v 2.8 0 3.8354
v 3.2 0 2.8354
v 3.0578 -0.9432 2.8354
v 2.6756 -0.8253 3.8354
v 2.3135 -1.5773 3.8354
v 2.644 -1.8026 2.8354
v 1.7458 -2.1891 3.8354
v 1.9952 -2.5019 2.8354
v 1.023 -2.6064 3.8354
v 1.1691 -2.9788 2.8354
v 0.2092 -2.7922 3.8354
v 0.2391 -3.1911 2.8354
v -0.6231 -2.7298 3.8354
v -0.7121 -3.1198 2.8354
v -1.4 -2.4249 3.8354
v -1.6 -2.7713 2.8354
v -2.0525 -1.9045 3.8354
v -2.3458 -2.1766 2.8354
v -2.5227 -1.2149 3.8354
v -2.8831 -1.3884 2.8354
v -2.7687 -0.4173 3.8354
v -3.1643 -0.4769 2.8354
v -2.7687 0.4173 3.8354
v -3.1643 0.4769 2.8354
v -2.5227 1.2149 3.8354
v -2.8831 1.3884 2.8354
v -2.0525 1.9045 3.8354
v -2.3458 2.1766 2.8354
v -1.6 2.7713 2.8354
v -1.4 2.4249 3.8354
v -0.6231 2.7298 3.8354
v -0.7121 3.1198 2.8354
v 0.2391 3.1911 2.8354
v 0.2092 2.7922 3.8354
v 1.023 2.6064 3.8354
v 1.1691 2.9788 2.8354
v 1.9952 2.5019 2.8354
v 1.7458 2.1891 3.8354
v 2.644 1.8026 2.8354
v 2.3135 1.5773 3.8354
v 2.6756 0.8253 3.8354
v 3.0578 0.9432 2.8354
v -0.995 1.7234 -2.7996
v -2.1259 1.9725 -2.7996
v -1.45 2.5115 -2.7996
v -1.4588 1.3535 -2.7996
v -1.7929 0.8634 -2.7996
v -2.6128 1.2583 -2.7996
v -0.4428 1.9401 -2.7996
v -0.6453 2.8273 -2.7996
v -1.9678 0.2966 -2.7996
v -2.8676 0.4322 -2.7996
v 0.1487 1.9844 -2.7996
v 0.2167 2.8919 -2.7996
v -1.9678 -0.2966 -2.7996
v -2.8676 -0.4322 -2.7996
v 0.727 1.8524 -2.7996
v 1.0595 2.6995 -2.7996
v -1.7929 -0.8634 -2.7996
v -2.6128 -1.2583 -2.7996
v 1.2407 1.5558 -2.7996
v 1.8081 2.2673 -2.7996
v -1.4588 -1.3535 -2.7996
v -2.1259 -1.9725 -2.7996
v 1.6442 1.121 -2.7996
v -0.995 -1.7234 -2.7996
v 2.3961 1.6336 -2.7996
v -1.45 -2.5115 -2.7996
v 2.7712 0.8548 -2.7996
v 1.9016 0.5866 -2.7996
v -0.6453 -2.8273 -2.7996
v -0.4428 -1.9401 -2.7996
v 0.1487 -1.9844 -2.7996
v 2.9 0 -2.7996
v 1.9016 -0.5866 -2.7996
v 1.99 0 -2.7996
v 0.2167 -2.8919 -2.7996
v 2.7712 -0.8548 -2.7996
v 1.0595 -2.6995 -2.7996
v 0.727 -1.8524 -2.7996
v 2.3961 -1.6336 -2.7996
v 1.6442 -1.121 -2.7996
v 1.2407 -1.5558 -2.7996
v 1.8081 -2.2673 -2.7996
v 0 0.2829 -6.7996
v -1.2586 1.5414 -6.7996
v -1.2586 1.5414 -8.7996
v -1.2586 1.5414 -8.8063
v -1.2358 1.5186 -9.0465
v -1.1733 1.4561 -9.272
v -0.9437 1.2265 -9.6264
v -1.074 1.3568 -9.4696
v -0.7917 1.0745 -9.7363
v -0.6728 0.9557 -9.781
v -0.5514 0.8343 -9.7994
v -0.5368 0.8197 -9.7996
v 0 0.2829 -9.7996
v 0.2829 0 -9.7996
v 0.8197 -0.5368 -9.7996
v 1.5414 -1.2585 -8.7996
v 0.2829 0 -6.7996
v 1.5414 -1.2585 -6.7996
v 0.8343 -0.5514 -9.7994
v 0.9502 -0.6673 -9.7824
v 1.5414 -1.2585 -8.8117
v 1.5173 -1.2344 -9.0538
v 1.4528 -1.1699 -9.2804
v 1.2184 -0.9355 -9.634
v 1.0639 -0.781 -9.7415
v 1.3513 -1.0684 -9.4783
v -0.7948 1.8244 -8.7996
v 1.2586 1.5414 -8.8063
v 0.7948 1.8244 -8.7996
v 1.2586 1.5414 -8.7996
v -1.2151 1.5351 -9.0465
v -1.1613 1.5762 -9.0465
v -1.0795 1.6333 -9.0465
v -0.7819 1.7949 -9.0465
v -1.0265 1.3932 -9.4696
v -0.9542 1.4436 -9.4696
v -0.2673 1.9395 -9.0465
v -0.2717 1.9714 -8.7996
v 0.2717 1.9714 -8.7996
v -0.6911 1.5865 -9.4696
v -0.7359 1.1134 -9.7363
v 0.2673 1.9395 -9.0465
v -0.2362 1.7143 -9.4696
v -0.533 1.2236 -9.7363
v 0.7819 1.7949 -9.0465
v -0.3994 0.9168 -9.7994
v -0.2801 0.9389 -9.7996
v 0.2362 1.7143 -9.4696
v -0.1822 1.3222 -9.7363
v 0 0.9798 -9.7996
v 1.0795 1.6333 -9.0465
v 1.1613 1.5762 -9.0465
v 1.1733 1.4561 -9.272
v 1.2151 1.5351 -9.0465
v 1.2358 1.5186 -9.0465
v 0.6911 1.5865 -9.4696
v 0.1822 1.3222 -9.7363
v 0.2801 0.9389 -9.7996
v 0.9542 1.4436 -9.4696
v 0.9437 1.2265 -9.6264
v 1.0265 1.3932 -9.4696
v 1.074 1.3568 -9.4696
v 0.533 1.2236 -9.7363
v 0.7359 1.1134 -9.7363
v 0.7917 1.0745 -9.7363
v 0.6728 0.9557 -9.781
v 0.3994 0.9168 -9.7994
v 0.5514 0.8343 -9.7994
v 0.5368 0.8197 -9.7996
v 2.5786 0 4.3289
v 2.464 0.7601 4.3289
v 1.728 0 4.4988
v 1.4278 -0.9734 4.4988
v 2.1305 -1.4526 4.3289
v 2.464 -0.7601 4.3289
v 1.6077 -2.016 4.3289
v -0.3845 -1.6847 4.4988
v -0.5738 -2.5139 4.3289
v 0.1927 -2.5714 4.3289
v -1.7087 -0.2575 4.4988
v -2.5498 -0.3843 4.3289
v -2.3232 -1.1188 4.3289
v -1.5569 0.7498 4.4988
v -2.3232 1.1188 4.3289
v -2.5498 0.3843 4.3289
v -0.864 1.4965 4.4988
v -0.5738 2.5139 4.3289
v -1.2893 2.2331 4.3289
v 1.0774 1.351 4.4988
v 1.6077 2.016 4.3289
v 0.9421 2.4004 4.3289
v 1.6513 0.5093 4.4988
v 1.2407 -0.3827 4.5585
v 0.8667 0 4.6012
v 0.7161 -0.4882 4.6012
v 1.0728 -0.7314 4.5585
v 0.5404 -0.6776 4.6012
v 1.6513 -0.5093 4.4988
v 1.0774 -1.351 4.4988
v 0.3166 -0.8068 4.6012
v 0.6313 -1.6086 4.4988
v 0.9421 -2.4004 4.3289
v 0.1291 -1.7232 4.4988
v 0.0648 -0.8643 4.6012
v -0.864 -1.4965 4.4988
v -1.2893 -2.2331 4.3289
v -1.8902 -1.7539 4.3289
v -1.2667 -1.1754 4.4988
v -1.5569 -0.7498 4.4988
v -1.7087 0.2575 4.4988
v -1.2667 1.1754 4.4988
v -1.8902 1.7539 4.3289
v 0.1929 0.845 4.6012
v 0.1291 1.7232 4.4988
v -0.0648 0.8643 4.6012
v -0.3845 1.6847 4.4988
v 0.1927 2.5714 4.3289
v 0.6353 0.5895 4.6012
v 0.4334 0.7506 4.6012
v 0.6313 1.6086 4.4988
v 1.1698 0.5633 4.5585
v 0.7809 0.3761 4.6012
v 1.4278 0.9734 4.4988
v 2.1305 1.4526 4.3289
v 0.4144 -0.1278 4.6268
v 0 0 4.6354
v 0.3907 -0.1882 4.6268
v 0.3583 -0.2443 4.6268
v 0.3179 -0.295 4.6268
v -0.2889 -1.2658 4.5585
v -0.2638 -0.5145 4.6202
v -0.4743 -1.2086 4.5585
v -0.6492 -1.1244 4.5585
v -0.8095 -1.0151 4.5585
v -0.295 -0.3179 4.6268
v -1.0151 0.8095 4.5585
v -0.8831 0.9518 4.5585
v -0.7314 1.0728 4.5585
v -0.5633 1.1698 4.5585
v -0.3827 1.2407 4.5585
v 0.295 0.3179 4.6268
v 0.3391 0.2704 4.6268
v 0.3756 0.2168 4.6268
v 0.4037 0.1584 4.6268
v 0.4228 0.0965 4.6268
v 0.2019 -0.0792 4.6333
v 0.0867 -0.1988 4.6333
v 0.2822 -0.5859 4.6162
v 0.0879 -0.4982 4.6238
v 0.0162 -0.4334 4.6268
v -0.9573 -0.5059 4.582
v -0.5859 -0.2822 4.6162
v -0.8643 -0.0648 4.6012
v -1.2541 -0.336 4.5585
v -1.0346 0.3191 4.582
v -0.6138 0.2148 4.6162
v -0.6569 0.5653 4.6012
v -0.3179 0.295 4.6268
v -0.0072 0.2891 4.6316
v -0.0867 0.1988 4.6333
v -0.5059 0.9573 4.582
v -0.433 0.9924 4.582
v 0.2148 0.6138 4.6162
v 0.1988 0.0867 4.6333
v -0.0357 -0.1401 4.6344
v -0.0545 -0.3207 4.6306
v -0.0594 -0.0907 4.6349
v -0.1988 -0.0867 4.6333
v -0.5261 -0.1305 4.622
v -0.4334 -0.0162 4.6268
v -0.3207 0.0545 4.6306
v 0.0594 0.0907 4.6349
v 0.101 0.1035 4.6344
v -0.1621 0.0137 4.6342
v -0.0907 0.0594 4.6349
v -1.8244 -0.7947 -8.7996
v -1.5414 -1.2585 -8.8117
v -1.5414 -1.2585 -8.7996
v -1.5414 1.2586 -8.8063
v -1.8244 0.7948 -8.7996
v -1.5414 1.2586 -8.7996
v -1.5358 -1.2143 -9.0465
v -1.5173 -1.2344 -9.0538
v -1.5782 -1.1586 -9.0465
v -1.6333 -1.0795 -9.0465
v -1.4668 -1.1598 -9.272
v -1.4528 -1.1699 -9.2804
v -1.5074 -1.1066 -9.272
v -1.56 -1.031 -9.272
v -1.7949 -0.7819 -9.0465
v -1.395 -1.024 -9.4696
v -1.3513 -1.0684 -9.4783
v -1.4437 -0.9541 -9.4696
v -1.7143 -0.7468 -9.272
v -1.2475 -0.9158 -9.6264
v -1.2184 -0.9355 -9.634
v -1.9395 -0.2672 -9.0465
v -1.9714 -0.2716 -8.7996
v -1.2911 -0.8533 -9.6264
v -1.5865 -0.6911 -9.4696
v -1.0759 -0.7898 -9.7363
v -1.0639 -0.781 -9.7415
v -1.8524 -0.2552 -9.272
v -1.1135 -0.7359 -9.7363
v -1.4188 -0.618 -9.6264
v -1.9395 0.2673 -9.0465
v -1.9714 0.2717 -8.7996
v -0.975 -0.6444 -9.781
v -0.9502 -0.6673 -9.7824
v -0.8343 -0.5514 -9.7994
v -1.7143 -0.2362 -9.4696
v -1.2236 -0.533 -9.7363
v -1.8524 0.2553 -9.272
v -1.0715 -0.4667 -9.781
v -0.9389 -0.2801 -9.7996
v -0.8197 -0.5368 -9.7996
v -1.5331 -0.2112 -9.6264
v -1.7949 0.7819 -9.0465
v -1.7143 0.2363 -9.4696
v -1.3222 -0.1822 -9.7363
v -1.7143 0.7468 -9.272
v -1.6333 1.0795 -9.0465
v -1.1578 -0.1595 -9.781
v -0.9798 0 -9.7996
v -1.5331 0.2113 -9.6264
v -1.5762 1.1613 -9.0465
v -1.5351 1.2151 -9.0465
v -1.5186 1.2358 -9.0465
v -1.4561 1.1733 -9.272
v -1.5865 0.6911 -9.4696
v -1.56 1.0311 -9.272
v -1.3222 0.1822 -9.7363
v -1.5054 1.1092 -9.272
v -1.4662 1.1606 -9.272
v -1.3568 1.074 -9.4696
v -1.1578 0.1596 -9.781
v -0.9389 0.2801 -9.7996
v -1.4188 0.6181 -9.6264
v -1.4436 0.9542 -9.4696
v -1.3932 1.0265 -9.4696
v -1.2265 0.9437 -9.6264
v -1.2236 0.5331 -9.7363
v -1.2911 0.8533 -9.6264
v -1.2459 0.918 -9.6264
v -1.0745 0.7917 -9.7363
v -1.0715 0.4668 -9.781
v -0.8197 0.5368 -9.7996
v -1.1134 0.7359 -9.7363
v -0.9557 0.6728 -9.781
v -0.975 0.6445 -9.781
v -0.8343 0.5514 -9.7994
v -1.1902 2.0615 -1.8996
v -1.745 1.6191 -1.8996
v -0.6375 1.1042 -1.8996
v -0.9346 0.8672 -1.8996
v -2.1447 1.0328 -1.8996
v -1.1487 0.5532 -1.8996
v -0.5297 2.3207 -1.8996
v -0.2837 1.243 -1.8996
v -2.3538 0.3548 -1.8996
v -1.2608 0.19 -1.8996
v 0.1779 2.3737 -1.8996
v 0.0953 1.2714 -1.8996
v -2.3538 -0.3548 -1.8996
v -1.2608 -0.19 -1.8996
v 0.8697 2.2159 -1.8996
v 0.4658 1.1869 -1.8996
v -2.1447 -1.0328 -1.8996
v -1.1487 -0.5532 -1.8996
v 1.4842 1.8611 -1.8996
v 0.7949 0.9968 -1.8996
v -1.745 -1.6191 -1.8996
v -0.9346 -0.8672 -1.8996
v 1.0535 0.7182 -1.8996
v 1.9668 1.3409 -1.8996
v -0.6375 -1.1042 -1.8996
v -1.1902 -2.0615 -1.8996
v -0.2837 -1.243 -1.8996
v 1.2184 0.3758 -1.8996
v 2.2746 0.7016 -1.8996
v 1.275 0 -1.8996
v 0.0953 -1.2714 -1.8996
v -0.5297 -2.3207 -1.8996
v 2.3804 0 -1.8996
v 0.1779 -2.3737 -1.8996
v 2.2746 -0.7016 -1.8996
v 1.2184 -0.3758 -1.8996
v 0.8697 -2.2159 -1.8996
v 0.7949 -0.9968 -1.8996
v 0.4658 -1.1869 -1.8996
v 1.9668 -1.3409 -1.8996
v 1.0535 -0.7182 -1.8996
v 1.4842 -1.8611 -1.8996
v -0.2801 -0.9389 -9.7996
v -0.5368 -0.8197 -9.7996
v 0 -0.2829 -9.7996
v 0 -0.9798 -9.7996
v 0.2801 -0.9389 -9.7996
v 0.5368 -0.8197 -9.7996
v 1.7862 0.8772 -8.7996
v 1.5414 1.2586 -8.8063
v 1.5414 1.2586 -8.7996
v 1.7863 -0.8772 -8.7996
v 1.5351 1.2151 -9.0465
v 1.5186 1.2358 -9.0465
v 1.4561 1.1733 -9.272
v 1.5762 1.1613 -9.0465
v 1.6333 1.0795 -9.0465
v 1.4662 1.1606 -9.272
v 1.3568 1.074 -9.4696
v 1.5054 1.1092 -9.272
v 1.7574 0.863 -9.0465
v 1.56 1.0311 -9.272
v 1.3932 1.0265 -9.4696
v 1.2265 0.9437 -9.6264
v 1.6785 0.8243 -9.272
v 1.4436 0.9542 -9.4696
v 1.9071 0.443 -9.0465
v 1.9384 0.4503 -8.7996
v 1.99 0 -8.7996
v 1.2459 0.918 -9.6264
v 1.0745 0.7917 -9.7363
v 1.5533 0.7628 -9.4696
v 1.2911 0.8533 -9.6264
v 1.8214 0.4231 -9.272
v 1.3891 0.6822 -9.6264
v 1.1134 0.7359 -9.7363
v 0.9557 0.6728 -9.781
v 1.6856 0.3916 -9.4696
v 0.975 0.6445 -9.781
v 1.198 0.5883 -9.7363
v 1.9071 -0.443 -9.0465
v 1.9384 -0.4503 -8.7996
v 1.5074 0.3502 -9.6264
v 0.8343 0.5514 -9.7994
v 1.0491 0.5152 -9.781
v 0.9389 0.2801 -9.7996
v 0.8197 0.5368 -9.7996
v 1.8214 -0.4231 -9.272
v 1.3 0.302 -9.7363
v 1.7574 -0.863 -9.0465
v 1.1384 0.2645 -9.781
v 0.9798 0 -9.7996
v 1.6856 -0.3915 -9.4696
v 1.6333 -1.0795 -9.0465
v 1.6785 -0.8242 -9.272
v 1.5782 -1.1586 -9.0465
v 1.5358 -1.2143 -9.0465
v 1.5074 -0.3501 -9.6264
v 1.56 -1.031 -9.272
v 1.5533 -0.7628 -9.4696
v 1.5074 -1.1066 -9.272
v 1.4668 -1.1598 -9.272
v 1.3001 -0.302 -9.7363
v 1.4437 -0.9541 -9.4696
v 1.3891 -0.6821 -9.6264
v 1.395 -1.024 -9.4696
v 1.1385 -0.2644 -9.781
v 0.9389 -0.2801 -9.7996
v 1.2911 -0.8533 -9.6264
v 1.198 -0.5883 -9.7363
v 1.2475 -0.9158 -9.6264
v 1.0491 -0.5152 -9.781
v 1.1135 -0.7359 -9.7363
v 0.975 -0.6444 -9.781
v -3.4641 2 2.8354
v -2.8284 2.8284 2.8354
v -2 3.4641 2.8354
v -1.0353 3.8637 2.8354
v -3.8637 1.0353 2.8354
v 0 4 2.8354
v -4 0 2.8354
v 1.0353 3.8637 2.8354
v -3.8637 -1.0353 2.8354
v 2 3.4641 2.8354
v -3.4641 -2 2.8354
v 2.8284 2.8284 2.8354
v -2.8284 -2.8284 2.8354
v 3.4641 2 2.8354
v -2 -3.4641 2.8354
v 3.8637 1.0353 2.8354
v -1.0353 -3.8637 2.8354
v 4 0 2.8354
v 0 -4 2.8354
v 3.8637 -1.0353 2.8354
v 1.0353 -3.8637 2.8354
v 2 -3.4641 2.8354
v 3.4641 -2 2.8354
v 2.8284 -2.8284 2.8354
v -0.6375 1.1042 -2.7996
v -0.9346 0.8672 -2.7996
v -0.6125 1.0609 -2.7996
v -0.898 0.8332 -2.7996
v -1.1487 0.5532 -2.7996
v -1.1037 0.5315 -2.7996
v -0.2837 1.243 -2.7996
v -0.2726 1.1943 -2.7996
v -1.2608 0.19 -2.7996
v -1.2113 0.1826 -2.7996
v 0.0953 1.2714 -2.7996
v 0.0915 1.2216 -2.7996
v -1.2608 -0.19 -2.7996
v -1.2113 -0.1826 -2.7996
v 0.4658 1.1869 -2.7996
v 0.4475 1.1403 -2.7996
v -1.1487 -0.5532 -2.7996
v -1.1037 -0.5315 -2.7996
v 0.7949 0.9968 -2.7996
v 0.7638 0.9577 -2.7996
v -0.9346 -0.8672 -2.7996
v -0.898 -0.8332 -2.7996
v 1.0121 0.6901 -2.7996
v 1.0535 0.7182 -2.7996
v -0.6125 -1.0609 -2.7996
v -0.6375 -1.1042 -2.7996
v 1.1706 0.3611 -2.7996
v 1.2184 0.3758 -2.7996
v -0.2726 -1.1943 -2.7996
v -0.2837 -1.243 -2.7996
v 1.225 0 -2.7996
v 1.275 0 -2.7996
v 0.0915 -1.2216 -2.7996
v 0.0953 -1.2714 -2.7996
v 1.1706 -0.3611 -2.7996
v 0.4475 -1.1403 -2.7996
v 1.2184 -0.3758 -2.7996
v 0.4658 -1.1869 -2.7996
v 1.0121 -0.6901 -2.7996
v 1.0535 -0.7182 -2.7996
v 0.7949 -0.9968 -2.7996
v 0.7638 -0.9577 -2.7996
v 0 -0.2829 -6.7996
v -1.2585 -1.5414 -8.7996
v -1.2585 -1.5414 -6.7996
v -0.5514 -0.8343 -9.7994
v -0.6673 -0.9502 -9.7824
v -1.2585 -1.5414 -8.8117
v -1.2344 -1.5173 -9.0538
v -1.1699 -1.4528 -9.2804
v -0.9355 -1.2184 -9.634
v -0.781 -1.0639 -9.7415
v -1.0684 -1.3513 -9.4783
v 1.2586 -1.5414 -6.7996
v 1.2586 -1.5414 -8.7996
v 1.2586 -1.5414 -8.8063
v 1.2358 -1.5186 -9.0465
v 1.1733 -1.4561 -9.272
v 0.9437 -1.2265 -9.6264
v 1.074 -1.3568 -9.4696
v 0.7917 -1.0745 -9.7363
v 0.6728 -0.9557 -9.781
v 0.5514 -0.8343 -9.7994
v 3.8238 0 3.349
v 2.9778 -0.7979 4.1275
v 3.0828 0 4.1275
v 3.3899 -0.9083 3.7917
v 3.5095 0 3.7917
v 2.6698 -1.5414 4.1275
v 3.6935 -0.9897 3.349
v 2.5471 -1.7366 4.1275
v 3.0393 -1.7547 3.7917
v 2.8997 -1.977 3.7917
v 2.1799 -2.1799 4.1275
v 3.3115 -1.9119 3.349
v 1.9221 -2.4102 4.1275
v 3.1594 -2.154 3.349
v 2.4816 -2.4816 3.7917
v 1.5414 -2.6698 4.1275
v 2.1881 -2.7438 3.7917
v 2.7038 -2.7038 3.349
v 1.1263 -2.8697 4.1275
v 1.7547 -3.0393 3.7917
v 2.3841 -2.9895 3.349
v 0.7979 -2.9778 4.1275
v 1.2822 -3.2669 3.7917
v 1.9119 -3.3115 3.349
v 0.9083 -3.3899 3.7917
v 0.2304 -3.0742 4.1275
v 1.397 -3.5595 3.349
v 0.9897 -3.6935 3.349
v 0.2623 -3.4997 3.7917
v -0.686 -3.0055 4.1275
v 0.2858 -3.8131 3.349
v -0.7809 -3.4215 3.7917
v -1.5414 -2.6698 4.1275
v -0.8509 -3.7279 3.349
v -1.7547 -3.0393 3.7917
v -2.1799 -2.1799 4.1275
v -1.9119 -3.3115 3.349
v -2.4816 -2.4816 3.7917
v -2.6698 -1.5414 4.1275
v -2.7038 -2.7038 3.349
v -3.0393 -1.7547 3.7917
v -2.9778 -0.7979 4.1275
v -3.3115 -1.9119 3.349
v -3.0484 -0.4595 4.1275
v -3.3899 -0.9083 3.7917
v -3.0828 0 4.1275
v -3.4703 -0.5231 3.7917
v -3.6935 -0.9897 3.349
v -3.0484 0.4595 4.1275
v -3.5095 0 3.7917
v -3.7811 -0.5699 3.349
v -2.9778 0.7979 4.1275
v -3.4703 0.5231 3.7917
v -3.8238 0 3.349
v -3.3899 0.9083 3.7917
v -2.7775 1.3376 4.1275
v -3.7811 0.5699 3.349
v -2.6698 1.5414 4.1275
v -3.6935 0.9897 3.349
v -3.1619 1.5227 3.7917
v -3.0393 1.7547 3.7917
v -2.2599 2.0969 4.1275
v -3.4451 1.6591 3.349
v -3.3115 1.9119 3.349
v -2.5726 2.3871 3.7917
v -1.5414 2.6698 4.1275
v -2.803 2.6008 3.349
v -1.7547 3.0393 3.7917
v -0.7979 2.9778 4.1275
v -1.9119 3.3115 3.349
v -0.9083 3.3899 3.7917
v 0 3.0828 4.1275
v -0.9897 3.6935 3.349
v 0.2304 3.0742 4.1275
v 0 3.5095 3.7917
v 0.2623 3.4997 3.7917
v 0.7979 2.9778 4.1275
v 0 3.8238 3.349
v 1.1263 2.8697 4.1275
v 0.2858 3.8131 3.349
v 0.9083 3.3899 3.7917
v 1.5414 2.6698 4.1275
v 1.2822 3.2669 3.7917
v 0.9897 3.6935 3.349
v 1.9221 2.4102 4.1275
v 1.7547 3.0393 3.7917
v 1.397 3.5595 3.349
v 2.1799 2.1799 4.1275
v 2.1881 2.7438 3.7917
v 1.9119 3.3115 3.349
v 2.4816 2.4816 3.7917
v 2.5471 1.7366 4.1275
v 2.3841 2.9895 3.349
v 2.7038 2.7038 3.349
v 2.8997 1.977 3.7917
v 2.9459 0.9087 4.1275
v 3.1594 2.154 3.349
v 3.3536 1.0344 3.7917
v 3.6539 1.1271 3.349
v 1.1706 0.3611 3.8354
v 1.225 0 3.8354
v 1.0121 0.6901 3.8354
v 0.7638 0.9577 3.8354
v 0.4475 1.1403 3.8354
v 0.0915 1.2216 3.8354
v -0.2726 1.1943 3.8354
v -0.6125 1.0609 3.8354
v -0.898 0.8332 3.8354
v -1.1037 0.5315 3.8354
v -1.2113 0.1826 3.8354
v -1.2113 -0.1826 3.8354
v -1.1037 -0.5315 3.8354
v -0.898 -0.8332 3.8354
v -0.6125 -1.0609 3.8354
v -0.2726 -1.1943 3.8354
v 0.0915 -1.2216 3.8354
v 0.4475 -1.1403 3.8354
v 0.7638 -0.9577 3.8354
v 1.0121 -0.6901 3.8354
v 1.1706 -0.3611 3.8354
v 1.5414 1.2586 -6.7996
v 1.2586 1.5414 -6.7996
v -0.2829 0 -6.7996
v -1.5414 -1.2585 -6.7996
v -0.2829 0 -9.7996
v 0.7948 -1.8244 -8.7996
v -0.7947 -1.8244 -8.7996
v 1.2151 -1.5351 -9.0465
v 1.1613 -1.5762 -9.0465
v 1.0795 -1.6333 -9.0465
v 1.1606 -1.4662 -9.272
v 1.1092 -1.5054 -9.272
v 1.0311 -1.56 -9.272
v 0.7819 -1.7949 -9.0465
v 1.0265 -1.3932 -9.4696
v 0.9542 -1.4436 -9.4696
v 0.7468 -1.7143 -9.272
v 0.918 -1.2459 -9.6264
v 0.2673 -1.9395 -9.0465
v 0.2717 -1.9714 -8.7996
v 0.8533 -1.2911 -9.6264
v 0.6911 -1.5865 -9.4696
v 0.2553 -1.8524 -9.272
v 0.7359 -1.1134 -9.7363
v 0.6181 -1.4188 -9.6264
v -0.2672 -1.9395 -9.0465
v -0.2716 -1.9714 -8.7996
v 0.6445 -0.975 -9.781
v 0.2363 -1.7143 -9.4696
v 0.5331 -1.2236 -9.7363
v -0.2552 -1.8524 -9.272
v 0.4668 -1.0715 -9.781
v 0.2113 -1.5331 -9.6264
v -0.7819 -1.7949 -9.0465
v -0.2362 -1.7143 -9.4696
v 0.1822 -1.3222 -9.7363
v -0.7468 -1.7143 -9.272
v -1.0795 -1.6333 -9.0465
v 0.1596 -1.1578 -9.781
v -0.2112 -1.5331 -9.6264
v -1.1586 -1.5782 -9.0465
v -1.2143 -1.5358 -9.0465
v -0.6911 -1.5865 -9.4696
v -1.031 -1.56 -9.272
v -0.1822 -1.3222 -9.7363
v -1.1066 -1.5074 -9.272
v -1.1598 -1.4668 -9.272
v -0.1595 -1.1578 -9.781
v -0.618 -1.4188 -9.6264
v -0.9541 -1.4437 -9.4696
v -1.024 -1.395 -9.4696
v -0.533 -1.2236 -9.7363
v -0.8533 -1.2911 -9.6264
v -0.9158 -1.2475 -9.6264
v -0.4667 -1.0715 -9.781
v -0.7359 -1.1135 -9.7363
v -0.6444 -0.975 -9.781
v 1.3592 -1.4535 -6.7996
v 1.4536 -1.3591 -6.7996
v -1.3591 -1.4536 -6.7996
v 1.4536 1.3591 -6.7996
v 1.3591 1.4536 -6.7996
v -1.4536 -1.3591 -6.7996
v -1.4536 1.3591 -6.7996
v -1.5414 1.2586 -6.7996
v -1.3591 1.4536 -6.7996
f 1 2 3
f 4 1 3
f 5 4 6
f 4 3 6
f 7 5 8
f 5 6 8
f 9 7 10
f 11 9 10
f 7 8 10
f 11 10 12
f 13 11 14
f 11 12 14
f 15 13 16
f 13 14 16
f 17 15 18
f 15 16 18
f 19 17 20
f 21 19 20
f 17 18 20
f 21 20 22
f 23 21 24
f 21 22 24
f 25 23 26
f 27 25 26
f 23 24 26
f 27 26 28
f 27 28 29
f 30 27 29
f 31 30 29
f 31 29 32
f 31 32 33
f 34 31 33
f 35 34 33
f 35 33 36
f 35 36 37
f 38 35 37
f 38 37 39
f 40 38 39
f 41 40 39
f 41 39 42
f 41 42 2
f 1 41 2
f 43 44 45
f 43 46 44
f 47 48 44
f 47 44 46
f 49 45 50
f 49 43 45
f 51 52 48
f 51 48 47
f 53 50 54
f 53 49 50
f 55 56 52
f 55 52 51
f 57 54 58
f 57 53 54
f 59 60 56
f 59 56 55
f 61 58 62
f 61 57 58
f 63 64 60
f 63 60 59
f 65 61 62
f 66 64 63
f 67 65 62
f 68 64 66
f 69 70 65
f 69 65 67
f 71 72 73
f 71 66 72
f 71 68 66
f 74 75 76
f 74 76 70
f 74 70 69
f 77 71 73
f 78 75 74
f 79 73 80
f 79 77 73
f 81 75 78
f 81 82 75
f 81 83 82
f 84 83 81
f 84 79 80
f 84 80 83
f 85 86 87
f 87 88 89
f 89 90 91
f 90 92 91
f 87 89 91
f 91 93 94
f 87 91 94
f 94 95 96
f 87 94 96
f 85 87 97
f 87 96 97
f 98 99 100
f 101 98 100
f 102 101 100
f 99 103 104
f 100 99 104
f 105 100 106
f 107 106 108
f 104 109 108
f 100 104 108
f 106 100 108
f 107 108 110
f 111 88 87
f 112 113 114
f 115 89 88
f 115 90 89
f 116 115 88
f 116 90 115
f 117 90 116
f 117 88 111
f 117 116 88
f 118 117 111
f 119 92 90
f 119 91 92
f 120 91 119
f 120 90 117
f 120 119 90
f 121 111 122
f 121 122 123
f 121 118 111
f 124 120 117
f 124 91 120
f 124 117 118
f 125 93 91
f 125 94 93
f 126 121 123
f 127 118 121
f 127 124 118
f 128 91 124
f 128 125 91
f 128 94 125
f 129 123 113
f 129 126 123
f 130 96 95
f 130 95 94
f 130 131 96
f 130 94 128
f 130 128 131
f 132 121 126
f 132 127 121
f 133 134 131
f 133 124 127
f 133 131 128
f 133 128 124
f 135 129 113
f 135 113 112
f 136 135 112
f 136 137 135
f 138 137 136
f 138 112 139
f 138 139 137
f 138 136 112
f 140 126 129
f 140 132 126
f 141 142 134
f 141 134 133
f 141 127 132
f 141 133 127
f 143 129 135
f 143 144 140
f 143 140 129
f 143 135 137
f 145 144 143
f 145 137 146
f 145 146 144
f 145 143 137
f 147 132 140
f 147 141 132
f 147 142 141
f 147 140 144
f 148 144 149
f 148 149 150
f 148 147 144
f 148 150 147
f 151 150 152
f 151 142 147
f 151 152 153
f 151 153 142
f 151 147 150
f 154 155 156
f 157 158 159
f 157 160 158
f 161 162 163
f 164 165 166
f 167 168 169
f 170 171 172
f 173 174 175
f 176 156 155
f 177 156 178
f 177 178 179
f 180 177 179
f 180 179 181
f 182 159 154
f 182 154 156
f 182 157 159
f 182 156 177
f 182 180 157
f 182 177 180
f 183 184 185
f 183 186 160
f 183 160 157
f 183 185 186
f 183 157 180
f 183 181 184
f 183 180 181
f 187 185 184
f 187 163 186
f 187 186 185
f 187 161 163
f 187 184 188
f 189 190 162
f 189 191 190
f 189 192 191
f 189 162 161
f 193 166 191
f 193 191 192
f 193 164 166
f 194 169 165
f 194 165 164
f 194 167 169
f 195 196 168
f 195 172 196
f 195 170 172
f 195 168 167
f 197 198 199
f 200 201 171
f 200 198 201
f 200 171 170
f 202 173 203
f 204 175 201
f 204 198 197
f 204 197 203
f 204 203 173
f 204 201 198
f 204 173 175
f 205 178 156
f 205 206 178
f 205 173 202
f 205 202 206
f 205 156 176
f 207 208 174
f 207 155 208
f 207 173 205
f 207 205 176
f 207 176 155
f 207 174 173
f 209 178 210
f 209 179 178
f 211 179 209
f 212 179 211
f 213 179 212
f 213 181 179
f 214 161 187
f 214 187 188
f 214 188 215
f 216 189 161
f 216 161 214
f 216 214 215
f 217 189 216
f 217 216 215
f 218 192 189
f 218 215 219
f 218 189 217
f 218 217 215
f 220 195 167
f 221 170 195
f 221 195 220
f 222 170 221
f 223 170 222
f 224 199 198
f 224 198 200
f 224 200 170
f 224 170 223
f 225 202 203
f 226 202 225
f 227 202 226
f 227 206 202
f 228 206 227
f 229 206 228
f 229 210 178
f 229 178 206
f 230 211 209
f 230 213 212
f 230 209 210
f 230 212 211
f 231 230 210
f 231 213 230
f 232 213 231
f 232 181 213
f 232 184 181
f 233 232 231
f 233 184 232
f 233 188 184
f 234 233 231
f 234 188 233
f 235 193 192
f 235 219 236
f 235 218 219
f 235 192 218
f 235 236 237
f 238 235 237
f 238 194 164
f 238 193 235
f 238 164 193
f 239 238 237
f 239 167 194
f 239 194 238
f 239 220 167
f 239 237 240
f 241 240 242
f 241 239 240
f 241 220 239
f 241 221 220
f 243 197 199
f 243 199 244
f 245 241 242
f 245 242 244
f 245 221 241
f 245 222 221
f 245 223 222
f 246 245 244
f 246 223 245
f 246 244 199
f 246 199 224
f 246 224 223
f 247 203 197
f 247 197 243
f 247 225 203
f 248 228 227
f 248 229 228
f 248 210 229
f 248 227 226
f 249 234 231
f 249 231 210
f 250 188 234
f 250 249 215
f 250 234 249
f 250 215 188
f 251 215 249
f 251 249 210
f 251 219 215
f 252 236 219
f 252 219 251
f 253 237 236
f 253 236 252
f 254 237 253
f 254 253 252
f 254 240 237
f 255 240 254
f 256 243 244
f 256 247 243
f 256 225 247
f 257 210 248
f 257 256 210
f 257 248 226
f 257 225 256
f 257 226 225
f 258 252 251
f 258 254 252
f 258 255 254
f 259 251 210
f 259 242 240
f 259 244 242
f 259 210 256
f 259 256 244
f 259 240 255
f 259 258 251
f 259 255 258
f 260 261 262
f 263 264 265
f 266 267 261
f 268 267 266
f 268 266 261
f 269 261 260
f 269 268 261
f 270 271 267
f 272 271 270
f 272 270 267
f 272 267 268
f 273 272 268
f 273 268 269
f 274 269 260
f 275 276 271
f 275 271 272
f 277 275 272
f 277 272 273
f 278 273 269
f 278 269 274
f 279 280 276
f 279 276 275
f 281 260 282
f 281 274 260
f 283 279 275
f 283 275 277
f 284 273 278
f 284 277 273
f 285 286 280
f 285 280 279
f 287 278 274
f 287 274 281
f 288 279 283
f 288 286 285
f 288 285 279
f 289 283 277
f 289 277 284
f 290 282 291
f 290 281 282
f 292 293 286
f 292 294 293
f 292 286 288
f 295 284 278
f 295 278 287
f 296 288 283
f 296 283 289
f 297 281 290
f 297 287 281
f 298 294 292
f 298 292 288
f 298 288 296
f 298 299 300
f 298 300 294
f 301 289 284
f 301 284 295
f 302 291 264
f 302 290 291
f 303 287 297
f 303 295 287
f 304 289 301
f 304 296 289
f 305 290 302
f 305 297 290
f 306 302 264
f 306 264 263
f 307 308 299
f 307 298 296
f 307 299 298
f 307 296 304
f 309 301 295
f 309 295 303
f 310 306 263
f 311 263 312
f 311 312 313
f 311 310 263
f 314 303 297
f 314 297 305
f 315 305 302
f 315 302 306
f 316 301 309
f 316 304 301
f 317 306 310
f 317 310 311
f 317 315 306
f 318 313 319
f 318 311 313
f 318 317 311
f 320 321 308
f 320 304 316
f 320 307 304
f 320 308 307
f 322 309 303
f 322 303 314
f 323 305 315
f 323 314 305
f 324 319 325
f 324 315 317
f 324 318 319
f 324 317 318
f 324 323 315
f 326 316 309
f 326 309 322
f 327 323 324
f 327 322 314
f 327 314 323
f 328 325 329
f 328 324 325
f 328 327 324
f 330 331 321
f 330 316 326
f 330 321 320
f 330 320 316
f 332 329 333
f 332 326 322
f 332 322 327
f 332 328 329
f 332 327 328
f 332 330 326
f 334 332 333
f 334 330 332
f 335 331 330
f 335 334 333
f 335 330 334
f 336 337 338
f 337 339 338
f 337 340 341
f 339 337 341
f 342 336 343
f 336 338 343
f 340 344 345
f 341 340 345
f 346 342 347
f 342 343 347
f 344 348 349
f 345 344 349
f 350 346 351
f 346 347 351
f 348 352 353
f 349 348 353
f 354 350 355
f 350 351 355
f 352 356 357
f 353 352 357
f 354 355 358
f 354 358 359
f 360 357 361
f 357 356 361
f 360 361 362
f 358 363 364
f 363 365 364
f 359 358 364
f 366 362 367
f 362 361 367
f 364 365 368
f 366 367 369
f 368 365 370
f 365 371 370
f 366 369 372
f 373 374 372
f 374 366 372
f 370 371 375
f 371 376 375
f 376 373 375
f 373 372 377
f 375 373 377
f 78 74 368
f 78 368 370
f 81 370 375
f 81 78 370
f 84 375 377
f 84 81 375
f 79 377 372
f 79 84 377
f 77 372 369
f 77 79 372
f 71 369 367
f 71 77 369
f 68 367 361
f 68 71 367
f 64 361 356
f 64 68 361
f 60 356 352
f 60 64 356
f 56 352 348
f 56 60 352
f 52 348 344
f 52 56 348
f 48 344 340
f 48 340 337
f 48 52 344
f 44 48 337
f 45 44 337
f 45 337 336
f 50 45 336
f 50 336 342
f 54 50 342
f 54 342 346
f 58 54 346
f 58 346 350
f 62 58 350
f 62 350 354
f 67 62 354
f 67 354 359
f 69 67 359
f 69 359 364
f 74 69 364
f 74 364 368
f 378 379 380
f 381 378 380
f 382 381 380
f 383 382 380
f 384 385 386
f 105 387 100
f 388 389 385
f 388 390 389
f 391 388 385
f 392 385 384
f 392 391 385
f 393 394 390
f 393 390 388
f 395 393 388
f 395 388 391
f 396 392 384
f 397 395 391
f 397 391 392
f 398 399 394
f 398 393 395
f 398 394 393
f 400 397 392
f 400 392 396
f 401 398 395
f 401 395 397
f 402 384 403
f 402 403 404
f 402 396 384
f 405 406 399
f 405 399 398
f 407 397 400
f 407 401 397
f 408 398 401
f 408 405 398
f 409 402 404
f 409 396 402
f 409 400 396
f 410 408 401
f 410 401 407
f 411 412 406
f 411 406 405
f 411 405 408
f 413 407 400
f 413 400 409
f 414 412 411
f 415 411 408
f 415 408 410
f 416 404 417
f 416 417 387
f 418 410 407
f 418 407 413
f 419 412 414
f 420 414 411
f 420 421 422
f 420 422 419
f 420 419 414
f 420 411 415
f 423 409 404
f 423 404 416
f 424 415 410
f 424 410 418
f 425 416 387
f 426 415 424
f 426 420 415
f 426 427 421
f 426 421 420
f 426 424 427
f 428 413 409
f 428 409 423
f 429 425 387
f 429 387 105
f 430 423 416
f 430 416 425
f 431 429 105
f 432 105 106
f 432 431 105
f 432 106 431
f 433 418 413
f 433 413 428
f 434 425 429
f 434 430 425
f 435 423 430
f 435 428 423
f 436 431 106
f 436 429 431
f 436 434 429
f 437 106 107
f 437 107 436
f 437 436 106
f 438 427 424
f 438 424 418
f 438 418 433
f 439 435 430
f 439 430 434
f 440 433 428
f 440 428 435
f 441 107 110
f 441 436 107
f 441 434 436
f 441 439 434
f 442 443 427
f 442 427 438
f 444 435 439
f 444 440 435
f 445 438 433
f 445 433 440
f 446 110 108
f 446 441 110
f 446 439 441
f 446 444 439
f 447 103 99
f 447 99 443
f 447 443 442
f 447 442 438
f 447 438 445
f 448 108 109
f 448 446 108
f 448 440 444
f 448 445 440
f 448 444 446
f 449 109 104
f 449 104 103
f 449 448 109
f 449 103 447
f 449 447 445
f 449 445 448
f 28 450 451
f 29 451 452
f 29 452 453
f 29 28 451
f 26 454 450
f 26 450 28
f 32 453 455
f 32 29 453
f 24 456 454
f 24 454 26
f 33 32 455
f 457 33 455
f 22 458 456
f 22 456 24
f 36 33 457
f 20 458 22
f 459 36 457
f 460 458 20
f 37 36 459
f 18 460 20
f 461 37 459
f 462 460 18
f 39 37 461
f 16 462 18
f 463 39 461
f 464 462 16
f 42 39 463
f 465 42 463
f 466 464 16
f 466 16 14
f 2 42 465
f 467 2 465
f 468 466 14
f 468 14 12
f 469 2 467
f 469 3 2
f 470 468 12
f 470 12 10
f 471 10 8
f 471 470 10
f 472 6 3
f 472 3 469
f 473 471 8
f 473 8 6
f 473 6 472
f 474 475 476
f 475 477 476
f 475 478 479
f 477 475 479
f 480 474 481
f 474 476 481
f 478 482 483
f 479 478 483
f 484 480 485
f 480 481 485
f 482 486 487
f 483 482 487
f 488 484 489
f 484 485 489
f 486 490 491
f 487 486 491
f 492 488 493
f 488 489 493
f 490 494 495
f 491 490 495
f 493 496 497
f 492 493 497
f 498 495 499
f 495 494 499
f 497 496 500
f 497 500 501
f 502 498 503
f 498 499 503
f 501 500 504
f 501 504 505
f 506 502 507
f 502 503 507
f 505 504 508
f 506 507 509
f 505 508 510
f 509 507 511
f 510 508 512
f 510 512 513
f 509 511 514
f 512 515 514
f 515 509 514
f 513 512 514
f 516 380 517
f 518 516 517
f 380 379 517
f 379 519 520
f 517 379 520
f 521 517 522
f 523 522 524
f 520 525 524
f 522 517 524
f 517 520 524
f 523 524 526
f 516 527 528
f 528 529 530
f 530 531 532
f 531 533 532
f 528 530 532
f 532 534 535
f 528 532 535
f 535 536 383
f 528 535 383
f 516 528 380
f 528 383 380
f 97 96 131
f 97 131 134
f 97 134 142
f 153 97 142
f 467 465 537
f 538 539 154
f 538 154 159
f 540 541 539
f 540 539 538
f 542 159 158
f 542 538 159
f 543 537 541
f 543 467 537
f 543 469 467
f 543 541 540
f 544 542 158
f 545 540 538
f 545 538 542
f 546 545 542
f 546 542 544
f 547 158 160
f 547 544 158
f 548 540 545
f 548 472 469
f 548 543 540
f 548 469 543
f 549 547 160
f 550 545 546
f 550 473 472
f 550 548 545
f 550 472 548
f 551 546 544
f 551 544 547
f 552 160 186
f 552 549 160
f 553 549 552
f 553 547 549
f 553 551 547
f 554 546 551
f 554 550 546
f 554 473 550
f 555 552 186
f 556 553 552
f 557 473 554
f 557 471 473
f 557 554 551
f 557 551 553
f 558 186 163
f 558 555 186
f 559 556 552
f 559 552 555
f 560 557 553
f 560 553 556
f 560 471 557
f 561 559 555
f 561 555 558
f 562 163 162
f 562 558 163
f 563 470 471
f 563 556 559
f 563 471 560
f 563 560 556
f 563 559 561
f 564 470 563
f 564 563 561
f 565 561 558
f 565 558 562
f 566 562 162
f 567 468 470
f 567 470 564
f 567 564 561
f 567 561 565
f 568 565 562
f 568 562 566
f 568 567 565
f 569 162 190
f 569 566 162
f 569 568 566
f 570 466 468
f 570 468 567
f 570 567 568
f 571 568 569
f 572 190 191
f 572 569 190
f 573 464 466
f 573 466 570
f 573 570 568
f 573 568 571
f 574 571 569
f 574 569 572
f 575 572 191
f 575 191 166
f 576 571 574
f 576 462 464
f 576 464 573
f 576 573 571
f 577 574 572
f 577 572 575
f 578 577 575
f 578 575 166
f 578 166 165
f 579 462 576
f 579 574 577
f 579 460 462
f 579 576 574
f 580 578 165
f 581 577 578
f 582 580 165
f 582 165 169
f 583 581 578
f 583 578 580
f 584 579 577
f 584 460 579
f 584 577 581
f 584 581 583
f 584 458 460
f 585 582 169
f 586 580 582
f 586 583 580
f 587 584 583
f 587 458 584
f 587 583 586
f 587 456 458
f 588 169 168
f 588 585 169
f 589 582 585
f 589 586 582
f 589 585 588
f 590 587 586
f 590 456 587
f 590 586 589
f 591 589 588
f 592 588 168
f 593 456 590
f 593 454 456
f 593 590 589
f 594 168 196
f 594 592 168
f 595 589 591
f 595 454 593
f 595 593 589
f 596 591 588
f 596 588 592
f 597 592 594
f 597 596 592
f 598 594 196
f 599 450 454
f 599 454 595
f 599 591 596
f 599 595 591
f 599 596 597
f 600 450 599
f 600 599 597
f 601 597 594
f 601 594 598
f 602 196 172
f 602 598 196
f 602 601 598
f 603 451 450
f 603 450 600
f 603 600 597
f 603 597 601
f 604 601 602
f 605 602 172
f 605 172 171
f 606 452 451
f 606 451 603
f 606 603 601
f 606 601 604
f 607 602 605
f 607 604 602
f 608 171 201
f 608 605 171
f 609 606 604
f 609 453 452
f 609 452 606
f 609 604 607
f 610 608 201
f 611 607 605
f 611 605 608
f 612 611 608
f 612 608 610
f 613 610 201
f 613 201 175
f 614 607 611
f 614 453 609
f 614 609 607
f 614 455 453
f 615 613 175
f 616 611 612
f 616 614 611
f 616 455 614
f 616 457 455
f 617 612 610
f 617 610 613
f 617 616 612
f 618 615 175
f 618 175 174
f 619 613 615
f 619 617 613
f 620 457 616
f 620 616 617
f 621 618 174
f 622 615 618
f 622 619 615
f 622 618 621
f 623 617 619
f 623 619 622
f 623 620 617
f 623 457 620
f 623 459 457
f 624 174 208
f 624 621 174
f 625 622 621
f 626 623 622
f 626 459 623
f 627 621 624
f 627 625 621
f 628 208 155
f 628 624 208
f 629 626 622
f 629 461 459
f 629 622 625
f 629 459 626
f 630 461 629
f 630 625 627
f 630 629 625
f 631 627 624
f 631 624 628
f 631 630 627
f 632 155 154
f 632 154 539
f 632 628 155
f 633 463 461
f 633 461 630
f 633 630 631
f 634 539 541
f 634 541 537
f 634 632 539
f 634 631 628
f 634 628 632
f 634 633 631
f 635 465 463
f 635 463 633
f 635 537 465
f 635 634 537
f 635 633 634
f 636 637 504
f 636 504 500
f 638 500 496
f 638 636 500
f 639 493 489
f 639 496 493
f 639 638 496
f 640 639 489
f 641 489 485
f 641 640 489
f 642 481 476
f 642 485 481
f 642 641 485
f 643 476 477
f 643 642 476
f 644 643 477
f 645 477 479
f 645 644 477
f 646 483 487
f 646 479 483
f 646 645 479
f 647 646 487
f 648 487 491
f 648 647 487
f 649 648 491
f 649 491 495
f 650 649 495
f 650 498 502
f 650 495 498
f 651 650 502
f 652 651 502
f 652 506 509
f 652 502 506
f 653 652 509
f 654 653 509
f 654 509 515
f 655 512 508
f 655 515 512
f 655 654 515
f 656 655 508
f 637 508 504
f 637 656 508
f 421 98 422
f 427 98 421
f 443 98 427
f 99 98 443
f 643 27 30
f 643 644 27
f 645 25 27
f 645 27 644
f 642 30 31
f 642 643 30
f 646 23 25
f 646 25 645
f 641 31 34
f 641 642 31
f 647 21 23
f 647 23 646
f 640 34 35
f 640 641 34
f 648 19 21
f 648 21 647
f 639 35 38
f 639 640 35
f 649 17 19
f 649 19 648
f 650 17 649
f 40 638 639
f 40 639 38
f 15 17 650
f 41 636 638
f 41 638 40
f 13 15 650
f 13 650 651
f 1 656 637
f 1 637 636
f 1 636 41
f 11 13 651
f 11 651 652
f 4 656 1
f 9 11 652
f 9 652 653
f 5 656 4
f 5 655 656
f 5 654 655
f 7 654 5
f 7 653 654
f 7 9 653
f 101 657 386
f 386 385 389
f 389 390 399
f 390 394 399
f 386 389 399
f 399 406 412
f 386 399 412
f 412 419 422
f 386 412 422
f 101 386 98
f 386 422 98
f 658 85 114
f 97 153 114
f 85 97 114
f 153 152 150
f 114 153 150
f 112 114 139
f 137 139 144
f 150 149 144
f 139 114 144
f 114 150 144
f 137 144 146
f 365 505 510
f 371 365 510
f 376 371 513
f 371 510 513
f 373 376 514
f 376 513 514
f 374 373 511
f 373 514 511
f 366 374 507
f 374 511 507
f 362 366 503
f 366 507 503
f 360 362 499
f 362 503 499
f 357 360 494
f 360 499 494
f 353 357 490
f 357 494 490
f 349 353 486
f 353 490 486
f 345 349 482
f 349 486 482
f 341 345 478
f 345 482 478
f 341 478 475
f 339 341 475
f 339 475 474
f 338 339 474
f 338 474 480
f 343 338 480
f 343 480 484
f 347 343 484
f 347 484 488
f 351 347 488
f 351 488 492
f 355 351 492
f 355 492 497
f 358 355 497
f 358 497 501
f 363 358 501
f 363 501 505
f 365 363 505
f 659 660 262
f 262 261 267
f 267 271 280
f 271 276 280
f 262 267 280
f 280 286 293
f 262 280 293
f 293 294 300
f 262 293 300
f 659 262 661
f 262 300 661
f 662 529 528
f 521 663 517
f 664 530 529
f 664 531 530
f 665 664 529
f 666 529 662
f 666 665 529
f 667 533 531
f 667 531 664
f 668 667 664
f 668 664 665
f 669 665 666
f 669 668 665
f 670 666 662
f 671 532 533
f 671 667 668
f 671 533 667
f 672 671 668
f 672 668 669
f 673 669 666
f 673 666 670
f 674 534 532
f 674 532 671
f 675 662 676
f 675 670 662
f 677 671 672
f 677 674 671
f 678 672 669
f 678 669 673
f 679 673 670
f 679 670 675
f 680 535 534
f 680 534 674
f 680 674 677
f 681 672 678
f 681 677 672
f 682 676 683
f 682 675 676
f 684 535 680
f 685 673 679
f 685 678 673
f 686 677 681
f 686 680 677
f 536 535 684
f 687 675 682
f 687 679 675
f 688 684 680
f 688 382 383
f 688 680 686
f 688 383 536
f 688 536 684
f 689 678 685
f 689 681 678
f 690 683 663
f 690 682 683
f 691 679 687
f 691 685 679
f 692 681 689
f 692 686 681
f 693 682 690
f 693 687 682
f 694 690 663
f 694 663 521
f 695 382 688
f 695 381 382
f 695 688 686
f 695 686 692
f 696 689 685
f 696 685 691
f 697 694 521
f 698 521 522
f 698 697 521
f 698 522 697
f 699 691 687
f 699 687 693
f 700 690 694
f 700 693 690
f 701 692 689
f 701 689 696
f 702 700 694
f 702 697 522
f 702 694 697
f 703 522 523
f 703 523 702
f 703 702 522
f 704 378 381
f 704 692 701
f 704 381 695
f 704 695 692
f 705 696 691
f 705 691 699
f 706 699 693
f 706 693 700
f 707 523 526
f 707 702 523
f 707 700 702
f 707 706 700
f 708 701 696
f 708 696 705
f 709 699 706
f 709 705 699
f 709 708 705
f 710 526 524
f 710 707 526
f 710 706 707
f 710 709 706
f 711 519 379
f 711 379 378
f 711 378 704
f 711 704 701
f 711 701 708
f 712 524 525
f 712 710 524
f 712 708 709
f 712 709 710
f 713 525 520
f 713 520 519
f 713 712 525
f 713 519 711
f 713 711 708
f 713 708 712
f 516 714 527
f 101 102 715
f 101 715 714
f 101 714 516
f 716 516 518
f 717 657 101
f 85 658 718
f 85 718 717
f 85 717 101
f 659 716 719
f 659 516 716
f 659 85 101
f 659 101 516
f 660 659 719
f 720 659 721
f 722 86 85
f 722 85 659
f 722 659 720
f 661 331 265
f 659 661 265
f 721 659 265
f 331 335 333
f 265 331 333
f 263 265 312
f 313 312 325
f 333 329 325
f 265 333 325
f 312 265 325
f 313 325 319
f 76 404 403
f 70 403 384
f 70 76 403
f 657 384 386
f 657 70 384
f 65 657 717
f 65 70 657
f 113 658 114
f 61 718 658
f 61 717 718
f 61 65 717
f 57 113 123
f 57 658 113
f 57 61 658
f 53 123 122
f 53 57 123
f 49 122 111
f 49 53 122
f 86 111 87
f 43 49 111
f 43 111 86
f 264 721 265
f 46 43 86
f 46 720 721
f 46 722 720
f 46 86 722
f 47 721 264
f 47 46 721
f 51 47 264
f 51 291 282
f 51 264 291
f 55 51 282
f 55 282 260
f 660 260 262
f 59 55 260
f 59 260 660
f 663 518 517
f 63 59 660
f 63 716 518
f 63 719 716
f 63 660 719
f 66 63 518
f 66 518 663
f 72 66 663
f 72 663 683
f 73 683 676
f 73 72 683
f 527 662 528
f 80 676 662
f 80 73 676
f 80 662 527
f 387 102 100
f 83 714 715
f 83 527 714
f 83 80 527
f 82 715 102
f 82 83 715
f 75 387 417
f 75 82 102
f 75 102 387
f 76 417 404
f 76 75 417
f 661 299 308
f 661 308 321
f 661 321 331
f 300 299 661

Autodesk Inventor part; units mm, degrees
ref_plane "YZ Plane" through (0, 0, 0) normal (1, 0, 0) x (0, 1, 0)
ref_plane "XZ Plane" through (0, 0, 0) normal (0, 1, 0) x (-1, 0, 0)
ref_plane "XY Plane" through (0, 0, 0) normal (0, 0, 1) x (1, 0, 0)
sketch "Sketch1" plane through (0, 0, 0) normal (0, 1, 0) x (-1, 0, 0)
  line L0 (-1.99, -2.7996) -> (-2.9, -2.7996)
  line L1 (-2.9, -2.7996) -> (-2.3804, -1.8996)
  line L2 (-2.3804, -1.8996) -> (-1.275, -1.8996)
  line L3 (-1.275, -1.8996) -> (-1.275, -2.7996)
  line L4 (-1.275, -2.7996) -> (-1.225, -2.7996)
  line L5 (-1.225, -2.7996) -> (-1.225, 3.8354)
  line L6 (-1.225, 3.8354) -> (-2.8, 3.8354)
  line L7 (-2.8, 3.8354) -> (-3.2, 2.8354)
  line L8 (-3.2, 2.8354) -> (-4, 2.8354)
  arc A0 (-2.5786, 4.3289) -> (-4, 2.8354) centre (-2.1332, 2.4819) ccw
  arc A1 (0, 4.6354) -> (-2.5786, 4.3289) centre (0, -6.3646) ccw
  line L9 (-1.99, -8.7996) -> (-1.99, -2.7996)
  spline S0 degree 3 poles (-1.99, -8.7996) (-1.99, -8.9227) (-1.9611, -9.0675) (-1.8666, -9.2952) (-1.7841, -9.4182) (-1.6089, -9.5929) (-1.4849, -9.6753) (-1.2538, -9.7706) (-1.1056, -9.7996) (-0.9798, -9.7996) knots 0.751438 0.751438 0.751438 0.751438 0.788362 0.788362 0.82538 0.82538 0.862606 0.862606 0.900353 0.900353 0.900353 0.900353
  line L10 (0, 4.6354) -> (0, -9.7996)
  line L11 (0, -9.7996) -> (-0.9798, -9.7996)
  point P0 (0, 0)
  point P1 (0, 0)
revolve "Revolution1" add sketch "Sketch1" angle 360 about axis through (0, 0, 4.6354) along (0, 0, -1)
sketch "Sketch2" plane through (0, 0, -9.7996) normal (0, 0, -1) x (-1, 0, 0)
  line L0 (0, 0.2829) -> (-1.2586, 1.5414)
  arc A0 (0.5514, 0.8343) -> (-0.5514, 0.8343) centre (0, 0) ccw
  line L1 (1.2586, 1.5414) -> (0, 0.2829)
  line L2 (0, -0.2829) -> (1.2585, -1.5414)
  arc A1 (-0.5514, -0.8343) -> (0.5514, -0.8343) centre (0, 0) ccw
  line L3 (-1.2586, -1.5414) -> (0, -0.2829)
  line L4 (0.2829, 0) -> (1.5414, 1.2586)
  arc A2 (0.8343, -0.5514) -> (0.8343, 0.5514) centre (0, 0) ccw
  line L5 (1.5414, -1.2585) -> (0.2829, 0)
  arc A3 (-0.8343, 0.5514) -> (-0.8343, -0.5514) centre (0, 0) ccw
  line L6 (-0.2829, 0) -> (-1.5414, -1.2585)
  line L7 (-1.5414, 1.2586) -> (-0.2829, 0)
  arc A4 (-1.2657, -1.5485) -> (1.2657, -1.5485) centre (0, 0) ccw
  circle A5 centre (0, 0) radius 1.99 projected
  point P0 (0, 0)
  point P1 (0, 0)
  point P2 (-1.99, 0)
extrude "Extrusion1" cut sketch "Sketch2" against normal blind 3 contours L1 A5 L4 L5 L2 L3 L6 L7 L0
properties part number "11-6002" material "Polystyrene, High Impact"
